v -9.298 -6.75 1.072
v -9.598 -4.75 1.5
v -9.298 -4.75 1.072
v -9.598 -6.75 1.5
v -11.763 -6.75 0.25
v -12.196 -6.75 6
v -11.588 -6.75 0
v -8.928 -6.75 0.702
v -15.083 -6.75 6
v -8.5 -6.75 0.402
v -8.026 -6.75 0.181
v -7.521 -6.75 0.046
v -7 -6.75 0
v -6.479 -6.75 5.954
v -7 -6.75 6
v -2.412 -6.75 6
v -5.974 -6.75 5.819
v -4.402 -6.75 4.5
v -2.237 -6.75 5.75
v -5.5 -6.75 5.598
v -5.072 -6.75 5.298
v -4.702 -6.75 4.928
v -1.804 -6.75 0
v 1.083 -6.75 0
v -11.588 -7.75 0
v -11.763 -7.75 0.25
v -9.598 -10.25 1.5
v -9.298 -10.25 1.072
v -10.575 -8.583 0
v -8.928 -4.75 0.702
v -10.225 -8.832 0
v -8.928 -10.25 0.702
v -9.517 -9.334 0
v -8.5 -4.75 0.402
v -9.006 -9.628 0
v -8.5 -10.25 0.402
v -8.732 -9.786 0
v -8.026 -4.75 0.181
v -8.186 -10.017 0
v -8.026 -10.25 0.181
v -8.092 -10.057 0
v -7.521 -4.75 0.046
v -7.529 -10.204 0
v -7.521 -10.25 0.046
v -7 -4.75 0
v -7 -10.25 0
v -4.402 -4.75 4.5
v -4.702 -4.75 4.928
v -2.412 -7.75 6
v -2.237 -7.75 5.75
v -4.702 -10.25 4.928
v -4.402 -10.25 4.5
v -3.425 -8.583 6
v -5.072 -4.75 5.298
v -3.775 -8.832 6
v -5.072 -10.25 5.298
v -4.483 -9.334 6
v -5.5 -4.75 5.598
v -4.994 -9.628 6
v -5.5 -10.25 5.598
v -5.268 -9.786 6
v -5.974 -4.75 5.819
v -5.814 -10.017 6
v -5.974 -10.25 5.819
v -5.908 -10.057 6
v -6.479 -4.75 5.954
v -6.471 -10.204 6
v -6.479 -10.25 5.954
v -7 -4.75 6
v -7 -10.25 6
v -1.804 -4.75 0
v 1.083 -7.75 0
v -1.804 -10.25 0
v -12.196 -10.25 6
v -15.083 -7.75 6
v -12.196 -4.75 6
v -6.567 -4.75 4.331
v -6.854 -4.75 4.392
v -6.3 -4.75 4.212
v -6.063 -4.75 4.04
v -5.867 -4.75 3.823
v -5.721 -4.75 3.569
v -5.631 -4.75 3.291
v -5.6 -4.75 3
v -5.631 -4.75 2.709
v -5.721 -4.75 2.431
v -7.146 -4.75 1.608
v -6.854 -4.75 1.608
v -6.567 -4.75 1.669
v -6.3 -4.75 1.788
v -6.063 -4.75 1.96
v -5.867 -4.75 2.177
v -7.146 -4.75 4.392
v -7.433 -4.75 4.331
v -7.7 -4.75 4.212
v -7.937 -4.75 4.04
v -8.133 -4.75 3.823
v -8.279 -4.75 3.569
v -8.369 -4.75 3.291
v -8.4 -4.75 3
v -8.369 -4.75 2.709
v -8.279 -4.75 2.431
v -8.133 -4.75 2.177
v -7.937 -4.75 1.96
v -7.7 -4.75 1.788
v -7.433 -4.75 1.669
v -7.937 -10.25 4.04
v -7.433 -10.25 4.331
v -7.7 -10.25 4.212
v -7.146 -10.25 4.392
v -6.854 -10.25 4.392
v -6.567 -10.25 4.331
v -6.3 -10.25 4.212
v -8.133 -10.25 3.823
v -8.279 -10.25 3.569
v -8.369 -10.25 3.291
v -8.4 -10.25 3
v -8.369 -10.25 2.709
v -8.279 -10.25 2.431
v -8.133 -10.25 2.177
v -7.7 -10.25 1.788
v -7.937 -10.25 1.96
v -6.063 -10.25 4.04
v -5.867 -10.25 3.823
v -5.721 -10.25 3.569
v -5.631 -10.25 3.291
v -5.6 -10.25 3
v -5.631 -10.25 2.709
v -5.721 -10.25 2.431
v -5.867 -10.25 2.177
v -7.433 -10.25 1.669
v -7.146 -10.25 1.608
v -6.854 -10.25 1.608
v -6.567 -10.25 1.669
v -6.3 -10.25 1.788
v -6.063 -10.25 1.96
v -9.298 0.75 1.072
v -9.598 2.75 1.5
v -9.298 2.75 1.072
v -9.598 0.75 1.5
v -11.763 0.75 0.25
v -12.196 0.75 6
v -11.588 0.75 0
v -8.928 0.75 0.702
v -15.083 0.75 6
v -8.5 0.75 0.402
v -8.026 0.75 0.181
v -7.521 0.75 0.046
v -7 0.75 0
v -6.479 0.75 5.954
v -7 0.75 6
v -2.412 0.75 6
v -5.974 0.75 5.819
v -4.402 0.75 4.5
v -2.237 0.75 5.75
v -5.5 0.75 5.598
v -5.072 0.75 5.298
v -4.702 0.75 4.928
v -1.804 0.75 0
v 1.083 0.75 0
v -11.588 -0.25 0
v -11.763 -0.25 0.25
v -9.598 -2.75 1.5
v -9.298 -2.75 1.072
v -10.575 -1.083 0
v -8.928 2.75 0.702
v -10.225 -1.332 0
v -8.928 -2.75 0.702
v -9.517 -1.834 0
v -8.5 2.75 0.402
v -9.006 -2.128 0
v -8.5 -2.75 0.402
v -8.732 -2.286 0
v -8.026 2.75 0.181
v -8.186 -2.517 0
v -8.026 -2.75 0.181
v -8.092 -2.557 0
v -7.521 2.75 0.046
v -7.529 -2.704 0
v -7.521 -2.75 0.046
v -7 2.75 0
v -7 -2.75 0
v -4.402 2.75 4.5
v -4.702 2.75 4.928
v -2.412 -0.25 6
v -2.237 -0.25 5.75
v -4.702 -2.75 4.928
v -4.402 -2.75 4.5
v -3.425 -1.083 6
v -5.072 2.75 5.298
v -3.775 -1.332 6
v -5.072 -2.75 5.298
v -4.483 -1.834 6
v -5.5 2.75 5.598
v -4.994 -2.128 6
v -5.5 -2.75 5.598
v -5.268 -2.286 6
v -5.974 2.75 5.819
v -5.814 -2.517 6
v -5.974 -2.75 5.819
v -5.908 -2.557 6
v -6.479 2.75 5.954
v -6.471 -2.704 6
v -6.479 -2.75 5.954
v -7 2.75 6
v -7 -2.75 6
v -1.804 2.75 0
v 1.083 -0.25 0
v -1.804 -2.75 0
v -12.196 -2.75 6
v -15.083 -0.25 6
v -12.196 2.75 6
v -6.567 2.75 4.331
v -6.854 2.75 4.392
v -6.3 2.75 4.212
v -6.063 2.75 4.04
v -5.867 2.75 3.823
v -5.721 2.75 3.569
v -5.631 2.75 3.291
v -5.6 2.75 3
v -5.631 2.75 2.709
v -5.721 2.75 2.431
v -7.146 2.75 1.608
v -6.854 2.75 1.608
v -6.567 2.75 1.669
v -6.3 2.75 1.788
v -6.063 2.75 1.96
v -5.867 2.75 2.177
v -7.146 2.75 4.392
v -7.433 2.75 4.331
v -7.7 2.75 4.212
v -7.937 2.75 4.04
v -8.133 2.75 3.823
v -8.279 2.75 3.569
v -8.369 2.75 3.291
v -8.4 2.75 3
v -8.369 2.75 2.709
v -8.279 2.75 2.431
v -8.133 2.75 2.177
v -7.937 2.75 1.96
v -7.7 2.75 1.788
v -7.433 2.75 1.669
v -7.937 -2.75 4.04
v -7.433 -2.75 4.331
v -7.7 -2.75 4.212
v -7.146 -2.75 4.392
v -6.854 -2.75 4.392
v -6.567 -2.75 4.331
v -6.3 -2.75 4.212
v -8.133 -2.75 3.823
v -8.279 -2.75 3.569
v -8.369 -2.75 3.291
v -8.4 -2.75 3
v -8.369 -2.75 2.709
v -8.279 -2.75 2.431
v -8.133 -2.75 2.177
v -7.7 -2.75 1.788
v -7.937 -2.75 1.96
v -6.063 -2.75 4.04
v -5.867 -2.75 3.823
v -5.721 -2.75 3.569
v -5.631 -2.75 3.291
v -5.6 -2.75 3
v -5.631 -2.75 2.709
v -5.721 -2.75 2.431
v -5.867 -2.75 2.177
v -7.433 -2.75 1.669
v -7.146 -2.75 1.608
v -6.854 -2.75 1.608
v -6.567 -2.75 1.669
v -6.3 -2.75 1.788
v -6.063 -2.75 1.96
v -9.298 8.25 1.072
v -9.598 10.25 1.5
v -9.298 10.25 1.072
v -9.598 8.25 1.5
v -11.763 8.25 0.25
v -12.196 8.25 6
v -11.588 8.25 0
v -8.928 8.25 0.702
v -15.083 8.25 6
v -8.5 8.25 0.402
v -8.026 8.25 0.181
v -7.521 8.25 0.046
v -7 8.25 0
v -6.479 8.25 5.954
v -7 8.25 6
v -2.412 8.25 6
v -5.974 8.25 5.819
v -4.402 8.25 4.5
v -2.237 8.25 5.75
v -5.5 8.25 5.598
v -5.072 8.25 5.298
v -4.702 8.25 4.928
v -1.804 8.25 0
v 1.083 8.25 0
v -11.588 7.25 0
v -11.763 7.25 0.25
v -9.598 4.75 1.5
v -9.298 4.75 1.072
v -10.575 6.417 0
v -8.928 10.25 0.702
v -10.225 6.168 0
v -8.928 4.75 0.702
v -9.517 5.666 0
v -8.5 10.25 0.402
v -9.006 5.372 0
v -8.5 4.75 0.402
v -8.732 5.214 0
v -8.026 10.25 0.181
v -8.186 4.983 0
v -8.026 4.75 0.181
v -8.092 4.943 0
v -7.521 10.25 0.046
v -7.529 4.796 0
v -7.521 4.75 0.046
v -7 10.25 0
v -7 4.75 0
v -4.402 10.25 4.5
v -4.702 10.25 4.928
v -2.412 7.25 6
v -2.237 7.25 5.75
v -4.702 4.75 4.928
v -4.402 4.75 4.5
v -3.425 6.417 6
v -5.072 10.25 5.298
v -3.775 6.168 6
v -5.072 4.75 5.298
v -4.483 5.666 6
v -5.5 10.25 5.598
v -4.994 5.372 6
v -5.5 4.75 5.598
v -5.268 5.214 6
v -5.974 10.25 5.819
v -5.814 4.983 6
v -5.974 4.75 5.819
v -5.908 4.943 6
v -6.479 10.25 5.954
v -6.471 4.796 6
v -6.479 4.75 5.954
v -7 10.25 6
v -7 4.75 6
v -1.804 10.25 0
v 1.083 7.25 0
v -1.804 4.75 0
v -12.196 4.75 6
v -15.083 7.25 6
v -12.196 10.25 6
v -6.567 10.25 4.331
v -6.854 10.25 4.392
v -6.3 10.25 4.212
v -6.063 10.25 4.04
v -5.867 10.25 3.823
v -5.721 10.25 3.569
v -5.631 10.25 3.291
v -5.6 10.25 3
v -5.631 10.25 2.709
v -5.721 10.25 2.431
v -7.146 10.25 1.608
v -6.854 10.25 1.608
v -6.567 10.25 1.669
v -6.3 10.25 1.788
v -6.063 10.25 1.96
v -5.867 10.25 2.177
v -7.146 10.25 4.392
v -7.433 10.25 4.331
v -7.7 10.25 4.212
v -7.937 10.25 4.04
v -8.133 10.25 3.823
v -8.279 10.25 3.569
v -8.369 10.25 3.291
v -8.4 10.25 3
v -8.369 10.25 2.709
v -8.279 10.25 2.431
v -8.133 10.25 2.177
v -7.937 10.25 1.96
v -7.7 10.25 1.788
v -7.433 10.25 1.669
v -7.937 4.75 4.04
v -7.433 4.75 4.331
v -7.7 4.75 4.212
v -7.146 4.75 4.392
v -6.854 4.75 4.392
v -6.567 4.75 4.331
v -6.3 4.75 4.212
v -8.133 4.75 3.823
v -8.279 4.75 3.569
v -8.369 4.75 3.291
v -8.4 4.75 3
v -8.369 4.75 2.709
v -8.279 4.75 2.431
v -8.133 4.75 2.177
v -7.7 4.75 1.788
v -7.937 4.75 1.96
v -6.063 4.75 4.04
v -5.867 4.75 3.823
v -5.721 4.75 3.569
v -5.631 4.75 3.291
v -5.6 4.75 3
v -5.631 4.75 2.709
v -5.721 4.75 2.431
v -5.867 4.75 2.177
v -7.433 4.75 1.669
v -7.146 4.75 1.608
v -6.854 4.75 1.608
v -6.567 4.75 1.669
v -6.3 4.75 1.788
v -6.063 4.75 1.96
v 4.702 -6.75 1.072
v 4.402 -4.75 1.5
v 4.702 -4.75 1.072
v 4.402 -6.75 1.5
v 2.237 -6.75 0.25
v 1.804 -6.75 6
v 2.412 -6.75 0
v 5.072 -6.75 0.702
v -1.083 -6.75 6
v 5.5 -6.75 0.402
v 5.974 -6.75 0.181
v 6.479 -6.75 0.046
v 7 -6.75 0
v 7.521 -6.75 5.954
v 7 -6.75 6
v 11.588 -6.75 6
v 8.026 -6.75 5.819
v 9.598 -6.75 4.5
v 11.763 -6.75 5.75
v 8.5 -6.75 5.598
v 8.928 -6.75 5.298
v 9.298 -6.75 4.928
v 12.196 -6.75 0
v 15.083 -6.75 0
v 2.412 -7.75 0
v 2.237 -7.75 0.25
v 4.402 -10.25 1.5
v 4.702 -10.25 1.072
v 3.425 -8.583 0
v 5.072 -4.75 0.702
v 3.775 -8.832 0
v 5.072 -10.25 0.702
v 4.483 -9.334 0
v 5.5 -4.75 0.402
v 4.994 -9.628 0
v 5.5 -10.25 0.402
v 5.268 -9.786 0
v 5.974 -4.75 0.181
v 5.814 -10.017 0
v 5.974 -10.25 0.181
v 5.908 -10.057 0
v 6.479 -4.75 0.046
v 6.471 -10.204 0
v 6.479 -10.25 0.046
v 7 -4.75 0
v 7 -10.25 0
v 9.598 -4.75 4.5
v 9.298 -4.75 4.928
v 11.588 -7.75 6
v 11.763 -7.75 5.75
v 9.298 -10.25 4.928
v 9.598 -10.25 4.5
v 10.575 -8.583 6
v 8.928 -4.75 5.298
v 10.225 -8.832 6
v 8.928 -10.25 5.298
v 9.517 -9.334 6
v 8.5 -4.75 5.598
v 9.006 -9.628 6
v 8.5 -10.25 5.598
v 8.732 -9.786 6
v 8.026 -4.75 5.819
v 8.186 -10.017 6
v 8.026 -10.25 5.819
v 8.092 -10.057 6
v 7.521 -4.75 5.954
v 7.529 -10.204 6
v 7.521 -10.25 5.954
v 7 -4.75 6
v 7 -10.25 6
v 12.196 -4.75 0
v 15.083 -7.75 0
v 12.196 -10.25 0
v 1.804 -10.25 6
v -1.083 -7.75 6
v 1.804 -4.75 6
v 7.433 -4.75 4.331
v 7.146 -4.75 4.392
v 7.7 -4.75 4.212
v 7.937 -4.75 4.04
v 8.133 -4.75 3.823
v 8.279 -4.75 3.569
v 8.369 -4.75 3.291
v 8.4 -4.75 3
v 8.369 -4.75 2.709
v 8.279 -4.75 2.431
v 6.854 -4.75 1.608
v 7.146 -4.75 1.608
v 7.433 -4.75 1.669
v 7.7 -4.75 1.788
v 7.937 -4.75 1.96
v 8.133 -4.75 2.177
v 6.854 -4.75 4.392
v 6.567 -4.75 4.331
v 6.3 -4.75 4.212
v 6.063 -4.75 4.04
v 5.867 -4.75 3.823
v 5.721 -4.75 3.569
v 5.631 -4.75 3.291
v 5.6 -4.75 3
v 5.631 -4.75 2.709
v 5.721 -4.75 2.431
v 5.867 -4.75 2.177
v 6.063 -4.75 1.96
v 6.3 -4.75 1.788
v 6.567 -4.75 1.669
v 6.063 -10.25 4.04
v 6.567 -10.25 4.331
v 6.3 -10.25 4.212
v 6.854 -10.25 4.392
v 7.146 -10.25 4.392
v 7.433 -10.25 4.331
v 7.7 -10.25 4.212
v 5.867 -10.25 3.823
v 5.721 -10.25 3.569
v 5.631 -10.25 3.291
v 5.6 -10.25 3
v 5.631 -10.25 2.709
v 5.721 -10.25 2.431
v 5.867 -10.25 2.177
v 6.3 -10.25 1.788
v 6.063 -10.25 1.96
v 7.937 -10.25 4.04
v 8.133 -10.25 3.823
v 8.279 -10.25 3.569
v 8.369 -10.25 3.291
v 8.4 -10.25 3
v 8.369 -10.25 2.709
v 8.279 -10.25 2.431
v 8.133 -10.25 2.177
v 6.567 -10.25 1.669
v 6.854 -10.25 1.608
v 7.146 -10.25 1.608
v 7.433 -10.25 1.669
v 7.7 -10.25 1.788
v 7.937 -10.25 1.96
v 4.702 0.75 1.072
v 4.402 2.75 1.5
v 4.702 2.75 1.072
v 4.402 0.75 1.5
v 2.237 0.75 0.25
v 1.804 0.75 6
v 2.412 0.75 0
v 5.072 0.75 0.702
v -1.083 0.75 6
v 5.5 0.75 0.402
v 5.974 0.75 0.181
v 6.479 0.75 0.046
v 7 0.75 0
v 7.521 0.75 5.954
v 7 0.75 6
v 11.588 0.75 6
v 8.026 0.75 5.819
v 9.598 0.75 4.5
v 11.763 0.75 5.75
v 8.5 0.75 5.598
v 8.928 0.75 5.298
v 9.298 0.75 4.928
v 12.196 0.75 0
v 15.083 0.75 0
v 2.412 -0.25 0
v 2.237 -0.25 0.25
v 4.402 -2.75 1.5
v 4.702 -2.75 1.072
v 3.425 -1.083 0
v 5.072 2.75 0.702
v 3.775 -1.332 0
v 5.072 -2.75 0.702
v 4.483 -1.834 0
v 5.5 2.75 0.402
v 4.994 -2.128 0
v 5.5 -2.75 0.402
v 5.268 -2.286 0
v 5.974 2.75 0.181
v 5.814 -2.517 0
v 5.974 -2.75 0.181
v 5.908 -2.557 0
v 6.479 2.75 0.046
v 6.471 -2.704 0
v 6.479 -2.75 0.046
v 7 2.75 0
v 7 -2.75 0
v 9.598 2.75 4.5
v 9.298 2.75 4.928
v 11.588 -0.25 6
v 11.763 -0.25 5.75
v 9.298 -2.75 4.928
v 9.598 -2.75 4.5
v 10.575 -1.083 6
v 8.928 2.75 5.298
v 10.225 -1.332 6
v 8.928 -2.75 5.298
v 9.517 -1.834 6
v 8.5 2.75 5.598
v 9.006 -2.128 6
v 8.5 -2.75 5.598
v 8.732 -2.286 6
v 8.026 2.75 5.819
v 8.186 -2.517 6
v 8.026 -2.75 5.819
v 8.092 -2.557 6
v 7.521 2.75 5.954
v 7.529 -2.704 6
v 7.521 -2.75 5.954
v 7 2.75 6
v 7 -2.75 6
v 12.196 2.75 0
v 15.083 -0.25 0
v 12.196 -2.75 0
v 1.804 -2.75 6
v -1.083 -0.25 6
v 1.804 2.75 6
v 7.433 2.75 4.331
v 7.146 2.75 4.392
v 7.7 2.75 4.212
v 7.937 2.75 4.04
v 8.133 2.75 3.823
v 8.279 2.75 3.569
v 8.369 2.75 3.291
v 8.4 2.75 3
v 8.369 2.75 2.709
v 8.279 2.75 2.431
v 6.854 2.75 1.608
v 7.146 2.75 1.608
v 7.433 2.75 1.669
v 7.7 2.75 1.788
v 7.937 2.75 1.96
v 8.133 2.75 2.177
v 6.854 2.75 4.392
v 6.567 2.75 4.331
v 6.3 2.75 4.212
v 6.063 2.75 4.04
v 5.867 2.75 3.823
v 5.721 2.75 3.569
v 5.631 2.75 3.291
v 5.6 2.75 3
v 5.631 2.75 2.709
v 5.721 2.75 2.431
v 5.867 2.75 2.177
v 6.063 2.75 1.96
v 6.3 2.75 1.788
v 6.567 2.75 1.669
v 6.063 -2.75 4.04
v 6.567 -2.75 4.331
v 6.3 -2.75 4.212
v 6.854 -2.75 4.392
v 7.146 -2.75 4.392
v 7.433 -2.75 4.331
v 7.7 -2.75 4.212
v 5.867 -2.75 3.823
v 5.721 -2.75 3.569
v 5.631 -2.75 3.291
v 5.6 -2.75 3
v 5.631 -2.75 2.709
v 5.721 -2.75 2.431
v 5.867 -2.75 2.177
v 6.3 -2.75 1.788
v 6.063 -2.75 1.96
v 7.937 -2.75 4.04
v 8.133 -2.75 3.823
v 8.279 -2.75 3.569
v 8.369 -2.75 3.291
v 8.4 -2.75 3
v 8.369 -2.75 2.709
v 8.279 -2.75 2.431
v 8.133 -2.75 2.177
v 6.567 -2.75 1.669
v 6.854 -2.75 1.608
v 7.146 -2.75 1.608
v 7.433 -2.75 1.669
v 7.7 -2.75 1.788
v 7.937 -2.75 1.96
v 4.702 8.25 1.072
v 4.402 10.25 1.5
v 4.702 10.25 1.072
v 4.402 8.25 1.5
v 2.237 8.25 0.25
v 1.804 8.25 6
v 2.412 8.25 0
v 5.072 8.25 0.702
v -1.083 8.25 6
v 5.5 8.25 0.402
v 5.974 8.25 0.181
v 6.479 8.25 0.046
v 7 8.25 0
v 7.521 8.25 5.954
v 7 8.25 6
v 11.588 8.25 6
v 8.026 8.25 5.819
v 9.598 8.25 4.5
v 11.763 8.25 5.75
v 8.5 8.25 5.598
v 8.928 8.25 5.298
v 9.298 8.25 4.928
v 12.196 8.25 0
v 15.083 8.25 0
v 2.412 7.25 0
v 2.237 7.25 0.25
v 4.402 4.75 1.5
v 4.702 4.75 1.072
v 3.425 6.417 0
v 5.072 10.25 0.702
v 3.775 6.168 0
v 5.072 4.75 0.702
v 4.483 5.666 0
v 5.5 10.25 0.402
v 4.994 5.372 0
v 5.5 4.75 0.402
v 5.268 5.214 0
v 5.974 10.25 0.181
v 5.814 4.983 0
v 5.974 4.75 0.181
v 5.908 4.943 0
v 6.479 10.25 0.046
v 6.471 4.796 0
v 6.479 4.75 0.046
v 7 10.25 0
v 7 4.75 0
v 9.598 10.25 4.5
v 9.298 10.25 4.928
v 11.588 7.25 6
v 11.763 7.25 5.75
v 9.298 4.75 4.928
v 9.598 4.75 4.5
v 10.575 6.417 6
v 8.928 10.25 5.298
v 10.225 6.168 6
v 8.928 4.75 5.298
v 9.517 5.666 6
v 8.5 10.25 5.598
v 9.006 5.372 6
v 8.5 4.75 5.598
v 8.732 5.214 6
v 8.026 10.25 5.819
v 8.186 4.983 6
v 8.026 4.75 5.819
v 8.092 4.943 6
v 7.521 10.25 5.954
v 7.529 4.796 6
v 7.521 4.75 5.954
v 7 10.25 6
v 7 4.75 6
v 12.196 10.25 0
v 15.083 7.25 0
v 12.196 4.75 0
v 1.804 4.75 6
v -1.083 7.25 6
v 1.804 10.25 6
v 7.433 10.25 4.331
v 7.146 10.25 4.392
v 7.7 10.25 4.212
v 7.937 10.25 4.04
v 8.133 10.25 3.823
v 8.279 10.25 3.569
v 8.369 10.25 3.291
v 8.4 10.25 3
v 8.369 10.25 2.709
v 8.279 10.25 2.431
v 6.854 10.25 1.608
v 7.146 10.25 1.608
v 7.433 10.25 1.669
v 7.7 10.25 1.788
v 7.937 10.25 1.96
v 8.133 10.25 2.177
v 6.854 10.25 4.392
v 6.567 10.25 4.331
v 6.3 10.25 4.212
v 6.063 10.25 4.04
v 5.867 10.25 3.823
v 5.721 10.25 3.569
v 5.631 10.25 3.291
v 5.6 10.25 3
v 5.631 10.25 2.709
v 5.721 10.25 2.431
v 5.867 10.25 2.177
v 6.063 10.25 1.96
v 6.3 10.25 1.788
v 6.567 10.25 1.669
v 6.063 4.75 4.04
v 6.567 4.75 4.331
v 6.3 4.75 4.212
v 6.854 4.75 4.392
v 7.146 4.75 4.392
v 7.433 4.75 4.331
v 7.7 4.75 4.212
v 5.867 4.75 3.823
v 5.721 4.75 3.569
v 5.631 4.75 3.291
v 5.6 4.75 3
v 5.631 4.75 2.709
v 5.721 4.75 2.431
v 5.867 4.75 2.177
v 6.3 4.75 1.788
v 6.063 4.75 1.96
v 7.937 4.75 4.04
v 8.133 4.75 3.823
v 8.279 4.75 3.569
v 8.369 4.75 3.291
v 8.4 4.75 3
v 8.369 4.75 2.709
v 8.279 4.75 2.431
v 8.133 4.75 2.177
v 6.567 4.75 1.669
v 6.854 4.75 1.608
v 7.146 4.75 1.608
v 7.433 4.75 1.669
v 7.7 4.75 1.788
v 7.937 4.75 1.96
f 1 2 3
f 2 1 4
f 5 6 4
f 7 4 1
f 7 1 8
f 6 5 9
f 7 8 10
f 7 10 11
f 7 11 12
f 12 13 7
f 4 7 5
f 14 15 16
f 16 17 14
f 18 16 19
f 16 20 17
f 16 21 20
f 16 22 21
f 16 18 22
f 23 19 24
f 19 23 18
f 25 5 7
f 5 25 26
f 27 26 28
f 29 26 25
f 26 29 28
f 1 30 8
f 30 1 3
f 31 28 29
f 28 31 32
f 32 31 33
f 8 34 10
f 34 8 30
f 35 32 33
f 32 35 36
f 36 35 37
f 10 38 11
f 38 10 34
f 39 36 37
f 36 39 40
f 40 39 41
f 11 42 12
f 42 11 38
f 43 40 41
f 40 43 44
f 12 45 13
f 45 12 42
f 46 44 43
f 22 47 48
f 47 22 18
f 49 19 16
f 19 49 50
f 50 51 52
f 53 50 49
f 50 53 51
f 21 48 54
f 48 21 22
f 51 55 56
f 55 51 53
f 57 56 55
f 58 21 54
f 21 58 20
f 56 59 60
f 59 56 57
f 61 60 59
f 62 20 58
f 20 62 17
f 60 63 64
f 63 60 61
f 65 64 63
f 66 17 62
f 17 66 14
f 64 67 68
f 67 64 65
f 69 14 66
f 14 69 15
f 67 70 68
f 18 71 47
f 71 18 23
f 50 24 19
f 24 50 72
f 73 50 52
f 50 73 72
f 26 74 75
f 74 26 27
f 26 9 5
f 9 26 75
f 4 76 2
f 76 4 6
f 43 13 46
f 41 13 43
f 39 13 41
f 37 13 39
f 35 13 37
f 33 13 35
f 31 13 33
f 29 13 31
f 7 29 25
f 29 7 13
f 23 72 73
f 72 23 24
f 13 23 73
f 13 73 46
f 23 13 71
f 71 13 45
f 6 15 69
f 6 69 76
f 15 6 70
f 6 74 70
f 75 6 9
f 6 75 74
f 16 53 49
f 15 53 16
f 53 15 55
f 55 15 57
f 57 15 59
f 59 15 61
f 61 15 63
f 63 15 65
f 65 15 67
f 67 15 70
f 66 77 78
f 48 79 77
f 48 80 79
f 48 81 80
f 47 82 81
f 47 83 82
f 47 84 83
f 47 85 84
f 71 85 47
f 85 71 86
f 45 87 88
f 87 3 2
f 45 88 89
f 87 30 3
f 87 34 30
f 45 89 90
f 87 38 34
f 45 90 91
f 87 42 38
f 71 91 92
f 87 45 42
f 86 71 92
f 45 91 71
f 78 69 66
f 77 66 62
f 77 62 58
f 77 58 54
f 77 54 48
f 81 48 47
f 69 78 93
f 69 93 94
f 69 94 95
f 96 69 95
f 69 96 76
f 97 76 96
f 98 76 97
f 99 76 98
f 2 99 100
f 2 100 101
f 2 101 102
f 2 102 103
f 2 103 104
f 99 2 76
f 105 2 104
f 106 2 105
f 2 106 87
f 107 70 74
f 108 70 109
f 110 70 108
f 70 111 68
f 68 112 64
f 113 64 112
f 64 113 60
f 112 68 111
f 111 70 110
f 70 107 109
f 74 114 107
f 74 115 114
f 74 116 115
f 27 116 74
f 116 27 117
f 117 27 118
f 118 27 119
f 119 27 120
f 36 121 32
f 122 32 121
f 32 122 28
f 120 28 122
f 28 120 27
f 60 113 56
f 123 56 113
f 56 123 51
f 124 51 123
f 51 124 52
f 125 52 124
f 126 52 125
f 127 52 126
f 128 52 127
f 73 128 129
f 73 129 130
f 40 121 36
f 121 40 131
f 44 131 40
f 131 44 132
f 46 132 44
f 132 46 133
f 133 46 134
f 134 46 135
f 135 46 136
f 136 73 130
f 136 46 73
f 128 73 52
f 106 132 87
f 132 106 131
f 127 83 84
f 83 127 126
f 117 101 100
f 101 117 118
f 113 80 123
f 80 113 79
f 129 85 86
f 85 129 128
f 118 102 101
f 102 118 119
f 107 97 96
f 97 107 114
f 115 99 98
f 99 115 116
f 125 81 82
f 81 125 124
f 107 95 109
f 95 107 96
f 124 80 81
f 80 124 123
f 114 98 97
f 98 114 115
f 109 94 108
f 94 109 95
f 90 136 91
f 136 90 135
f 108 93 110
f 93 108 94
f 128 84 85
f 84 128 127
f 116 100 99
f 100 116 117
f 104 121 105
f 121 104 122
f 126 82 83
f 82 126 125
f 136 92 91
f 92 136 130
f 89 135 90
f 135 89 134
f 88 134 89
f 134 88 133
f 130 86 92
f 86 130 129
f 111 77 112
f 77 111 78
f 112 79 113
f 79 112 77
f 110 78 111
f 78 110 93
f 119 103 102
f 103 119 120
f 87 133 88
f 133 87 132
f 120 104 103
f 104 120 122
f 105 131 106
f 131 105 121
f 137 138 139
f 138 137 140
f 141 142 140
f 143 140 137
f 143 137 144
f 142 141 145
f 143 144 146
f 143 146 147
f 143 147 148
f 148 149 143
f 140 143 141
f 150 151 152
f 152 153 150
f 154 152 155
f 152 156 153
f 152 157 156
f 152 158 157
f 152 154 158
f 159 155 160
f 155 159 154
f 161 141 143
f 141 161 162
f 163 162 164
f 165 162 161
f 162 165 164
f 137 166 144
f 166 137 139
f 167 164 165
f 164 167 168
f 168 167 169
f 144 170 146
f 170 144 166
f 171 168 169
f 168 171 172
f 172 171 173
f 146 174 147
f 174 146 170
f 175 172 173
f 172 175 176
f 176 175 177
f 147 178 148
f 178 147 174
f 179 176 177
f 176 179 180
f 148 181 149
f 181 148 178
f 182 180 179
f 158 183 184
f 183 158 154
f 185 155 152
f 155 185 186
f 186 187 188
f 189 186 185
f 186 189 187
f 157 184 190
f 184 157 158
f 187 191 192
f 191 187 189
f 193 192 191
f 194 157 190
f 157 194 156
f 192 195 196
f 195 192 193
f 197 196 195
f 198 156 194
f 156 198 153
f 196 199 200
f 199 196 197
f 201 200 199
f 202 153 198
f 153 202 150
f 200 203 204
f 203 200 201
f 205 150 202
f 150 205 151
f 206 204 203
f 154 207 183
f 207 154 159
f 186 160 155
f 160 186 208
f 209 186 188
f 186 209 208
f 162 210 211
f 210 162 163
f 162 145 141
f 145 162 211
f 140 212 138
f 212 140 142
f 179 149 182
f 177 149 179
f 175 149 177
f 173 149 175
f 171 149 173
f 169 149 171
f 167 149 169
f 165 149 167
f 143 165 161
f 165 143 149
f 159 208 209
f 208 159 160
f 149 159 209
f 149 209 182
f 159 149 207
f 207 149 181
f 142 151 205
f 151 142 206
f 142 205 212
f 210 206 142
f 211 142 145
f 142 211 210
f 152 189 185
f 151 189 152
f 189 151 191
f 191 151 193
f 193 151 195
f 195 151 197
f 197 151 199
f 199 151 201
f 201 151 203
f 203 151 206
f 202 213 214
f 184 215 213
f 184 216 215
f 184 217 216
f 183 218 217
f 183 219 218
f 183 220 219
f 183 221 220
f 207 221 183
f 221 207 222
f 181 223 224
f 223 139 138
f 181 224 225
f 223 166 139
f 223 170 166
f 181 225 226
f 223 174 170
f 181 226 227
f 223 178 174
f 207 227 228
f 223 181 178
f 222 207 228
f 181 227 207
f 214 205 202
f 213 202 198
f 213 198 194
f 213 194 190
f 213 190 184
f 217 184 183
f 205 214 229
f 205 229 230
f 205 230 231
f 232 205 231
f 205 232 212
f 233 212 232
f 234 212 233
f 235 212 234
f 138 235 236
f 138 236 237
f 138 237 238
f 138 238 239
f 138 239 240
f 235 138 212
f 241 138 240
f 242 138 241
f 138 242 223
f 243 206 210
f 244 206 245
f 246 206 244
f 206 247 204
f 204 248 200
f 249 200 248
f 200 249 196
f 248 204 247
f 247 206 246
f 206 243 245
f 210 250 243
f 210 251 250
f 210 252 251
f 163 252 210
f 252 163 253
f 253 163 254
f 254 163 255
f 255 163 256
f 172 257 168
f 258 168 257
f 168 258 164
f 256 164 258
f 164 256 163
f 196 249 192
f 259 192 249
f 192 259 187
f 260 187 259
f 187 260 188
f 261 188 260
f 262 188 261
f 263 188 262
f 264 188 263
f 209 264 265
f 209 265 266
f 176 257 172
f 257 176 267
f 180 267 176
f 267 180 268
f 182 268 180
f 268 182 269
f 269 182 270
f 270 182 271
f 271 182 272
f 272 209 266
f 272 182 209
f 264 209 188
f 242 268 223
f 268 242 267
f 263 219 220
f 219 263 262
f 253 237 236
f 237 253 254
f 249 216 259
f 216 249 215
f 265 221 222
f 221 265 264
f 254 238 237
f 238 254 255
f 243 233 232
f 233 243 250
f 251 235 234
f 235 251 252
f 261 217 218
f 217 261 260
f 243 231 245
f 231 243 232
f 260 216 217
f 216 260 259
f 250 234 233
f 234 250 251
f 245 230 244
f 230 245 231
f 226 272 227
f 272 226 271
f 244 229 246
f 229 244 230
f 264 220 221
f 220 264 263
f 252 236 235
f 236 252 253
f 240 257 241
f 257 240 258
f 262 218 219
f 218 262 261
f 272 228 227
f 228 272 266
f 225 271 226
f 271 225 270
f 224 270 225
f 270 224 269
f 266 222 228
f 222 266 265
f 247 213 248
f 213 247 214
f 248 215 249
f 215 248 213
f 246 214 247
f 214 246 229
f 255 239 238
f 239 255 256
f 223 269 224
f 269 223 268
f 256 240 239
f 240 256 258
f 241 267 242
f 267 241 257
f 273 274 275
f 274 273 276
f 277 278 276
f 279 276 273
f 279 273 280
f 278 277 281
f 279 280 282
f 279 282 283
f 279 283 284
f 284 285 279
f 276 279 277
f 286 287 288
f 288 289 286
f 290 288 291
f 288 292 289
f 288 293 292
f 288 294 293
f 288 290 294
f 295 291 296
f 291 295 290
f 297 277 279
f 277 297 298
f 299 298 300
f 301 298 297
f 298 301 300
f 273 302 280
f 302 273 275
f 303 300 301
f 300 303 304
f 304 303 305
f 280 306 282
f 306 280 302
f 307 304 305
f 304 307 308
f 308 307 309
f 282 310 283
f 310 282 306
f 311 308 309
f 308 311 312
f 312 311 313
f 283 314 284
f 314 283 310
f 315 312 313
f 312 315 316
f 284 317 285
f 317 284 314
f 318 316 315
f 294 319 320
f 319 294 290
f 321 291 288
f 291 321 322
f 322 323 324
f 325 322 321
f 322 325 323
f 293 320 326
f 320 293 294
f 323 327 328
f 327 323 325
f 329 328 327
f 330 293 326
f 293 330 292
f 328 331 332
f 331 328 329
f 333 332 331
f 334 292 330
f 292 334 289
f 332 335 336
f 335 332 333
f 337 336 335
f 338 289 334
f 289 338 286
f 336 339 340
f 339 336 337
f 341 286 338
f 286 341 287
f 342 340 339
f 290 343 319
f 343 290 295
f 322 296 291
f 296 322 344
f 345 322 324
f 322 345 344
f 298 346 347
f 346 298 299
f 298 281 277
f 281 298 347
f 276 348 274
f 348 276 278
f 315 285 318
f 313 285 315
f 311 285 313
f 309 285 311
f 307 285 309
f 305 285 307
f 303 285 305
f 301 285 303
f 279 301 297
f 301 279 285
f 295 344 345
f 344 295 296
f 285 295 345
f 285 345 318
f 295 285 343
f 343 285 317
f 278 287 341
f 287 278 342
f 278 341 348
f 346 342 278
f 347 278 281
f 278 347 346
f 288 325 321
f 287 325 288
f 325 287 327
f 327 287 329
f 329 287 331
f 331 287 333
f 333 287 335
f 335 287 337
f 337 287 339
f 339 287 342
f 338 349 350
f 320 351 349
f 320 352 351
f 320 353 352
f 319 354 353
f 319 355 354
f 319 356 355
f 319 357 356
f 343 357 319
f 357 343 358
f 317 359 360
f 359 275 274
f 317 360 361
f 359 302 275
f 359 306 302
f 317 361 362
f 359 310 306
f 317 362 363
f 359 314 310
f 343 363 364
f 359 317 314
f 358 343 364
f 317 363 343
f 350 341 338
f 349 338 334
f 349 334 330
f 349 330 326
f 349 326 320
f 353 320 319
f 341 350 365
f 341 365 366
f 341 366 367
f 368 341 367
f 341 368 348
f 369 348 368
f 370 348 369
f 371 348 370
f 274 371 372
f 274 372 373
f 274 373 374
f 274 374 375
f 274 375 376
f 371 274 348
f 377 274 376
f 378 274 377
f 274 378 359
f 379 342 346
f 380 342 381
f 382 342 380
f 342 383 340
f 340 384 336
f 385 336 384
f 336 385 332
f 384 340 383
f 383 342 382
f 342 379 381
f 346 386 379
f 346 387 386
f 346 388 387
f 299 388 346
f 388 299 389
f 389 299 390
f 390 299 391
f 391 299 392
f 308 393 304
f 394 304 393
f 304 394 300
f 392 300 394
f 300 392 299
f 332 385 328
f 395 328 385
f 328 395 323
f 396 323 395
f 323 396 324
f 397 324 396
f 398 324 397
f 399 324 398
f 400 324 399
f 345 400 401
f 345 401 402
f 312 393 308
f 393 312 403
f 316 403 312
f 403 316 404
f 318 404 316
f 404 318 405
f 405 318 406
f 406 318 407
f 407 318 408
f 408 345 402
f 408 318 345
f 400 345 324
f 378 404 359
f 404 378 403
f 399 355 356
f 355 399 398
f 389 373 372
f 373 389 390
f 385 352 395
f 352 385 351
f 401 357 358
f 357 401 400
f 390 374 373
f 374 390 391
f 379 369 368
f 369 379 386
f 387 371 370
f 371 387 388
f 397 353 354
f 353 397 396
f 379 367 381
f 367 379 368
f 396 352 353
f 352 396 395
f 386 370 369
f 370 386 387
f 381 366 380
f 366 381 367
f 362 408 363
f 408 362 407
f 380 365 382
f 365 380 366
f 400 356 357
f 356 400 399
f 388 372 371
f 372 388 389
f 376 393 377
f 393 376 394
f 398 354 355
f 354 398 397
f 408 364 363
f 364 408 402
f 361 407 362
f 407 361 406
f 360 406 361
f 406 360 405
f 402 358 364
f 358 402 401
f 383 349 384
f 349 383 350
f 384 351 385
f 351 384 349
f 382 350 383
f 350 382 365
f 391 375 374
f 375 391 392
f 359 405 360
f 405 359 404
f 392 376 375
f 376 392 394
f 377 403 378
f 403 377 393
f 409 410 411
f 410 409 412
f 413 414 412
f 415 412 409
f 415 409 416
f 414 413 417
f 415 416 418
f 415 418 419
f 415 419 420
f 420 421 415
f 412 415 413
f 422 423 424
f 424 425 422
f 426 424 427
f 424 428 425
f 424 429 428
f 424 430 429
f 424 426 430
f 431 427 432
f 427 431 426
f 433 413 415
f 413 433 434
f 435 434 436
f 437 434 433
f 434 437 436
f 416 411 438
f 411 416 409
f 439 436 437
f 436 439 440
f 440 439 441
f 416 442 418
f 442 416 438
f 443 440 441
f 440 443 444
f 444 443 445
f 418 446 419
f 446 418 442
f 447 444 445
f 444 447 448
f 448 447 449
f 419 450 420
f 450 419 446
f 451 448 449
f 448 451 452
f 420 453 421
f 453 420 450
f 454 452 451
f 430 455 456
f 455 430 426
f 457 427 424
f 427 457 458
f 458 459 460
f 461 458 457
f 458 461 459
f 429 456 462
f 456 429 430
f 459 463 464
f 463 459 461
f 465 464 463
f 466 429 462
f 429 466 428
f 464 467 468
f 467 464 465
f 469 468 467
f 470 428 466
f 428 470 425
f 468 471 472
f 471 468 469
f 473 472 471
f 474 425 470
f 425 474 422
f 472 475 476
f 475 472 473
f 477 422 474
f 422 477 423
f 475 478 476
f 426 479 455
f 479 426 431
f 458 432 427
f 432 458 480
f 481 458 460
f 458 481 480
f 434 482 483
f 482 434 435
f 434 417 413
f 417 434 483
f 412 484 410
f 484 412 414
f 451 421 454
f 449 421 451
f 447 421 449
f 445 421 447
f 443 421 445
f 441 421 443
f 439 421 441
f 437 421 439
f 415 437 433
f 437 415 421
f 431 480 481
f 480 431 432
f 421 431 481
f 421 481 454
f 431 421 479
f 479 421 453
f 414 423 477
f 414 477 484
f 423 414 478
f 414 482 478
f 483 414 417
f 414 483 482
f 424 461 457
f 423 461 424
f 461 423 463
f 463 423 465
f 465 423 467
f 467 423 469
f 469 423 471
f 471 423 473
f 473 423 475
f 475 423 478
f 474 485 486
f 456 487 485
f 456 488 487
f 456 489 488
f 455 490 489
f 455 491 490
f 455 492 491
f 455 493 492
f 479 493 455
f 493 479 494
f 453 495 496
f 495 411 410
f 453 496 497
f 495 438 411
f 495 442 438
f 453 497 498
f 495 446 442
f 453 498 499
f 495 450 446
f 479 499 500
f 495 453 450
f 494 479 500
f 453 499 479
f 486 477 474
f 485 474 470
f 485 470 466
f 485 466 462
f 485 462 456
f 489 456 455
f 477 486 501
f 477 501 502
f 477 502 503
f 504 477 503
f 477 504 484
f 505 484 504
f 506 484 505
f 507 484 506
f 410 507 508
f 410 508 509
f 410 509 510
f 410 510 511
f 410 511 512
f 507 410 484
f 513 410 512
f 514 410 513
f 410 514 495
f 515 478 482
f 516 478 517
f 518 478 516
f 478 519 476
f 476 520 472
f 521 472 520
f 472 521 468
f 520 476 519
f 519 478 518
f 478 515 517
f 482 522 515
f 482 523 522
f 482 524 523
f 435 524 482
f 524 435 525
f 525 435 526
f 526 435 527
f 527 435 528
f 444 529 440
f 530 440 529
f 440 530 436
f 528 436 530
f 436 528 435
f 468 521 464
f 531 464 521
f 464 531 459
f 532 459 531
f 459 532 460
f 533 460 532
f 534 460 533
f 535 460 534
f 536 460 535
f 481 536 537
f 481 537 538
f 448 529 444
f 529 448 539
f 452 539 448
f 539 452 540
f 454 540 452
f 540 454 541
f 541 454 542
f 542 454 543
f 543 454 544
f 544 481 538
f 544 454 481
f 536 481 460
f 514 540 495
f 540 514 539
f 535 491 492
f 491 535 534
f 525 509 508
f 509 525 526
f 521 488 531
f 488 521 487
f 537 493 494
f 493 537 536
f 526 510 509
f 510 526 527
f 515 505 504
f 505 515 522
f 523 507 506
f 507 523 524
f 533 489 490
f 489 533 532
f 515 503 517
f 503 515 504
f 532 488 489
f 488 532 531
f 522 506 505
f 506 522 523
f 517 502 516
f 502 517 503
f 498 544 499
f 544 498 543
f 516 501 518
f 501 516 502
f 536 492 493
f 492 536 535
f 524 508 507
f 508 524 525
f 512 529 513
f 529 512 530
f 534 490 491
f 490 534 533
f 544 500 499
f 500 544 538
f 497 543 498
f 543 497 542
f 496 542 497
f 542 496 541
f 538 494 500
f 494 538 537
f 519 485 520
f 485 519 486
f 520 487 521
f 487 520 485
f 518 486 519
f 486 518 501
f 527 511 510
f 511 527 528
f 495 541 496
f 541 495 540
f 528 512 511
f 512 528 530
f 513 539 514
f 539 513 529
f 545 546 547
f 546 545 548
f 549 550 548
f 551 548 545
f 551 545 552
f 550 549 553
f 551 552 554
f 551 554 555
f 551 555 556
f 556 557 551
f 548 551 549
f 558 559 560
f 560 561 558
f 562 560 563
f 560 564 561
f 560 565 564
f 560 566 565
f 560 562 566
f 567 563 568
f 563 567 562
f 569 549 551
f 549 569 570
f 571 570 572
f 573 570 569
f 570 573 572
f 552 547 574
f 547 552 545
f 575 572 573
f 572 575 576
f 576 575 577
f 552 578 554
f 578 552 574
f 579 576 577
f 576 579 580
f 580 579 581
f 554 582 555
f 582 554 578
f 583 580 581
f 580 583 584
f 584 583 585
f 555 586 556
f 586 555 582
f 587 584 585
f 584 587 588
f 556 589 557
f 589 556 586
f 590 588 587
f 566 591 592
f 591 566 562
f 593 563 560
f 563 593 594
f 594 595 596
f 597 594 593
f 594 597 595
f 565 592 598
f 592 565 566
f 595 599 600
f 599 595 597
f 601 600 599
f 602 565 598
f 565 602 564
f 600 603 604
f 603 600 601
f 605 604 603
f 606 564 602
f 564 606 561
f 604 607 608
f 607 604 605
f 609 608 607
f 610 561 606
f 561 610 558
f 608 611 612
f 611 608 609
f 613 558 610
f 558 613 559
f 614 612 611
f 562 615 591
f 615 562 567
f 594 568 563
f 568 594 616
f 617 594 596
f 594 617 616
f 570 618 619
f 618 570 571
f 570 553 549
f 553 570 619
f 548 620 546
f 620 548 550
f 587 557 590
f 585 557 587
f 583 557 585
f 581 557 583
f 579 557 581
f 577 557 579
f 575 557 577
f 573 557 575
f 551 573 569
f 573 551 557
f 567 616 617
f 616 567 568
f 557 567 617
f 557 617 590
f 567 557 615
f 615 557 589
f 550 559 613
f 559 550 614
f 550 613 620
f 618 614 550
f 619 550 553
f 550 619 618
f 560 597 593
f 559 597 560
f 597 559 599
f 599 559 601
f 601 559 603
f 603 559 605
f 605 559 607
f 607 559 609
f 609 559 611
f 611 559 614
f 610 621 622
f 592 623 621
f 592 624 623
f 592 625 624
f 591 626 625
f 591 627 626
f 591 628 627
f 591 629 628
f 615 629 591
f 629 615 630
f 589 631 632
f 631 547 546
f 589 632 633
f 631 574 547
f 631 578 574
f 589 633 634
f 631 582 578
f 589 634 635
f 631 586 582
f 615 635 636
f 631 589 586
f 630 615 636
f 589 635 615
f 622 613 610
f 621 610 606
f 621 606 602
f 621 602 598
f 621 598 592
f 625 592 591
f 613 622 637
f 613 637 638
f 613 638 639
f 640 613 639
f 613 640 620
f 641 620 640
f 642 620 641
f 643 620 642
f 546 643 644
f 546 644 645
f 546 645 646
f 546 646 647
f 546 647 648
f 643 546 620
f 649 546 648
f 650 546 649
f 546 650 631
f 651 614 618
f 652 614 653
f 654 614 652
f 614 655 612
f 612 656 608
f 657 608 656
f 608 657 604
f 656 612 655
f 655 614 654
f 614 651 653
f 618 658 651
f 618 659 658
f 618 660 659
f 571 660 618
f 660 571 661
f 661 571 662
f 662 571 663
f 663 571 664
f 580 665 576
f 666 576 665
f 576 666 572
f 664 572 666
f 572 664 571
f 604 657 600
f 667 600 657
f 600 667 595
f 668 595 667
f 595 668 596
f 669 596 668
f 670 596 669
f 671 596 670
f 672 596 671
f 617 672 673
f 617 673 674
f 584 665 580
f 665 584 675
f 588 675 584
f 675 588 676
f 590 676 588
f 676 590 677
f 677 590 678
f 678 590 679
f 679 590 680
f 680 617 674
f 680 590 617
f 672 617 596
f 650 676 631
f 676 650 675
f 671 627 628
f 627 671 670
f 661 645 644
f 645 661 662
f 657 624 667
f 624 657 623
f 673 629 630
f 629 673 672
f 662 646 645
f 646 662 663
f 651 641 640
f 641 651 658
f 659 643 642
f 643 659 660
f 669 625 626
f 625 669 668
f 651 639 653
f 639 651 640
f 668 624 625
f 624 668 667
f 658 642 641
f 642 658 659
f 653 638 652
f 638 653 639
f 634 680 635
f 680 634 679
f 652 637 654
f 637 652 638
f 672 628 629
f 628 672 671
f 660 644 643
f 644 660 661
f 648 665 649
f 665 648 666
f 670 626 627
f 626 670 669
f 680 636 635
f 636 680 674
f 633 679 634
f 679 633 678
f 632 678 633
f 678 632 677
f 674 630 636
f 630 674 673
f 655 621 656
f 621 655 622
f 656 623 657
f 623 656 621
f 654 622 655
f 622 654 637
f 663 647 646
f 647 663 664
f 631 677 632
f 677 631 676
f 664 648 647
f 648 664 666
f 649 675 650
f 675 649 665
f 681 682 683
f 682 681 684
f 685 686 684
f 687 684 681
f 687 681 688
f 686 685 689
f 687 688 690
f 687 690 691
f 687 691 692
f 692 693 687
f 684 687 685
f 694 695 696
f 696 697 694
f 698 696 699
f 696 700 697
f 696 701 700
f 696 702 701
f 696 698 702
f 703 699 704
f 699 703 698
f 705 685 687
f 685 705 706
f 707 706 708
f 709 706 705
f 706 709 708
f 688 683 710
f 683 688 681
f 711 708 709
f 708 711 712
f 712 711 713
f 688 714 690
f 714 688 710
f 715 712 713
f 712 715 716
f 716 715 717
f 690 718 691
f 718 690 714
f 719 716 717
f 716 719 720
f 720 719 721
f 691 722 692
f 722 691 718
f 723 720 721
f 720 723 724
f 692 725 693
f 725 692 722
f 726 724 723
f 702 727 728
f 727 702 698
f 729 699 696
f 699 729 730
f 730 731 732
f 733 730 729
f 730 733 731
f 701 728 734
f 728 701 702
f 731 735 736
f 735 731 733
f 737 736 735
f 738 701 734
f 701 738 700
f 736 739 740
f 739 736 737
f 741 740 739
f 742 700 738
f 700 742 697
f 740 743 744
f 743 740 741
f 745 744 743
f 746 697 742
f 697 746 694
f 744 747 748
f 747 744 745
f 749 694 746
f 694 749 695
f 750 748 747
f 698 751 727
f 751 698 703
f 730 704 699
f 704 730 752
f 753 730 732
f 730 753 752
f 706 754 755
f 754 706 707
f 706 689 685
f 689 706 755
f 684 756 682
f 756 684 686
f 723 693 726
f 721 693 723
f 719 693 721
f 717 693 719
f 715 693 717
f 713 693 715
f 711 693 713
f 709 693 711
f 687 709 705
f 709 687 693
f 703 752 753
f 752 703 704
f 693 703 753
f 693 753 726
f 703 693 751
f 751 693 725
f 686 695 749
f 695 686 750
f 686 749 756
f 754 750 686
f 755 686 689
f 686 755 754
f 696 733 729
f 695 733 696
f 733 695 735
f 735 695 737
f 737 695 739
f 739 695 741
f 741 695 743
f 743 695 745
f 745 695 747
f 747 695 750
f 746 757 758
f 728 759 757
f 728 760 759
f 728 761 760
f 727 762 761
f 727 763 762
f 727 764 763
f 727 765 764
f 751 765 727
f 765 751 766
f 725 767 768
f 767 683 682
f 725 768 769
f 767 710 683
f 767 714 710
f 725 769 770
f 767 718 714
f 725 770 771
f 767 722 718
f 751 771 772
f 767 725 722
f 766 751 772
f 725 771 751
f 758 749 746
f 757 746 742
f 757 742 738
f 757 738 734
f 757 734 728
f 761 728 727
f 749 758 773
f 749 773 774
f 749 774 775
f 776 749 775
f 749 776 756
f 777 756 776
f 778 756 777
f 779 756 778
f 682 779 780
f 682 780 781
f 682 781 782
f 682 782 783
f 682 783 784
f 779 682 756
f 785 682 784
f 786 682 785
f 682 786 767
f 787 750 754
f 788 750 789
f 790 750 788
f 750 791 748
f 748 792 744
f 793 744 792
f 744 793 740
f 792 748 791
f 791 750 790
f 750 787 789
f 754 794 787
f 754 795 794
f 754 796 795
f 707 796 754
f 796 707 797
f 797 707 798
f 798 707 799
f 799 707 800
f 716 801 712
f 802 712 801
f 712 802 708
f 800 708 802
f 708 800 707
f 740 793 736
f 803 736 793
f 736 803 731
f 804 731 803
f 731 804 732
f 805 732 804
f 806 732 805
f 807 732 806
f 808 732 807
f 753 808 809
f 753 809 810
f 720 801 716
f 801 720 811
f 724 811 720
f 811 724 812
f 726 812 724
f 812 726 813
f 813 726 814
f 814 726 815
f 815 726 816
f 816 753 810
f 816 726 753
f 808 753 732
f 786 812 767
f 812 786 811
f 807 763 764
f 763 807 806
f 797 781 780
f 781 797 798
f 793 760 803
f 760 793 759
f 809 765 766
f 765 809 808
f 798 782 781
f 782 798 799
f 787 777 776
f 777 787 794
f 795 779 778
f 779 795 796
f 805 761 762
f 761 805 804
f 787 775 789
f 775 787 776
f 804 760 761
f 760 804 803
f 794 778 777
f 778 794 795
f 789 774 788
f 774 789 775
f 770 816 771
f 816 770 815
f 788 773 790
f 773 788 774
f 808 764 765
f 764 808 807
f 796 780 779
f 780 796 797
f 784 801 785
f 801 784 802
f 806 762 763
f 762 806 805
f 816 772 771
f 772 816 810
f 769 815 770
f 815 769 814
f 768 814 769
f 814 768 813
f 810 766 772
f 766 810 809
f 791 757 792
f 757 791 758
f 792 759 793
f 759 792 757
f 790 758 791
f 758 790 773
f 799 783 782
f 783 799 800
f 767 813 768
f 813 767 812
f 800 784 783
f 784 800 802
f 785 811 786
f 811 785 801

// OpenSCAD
width = 11; //11 for 20mm, 14 for 25mm
slot_width = 6;
depth = 5.5; //5.5 for 20mm, 7 for 25mm
slot_depth = 2;
screw_size = 3;
nut_size = 6.2;
nut_depth = 3;

repeat_x = 2;
repeat_y = 3;

// ratio for converting diameter to apothem
/*
da6 = 1 / cos(180 / 6) / 2;
da8 = 1 / cos(180 / 8) / 2;
da12 = 1 / cos(180 / 12) / 2;
*/
%square(100, center = true);
for(x = [-(repeat_x - 1) / 2:(repeat_x - 1) / 2]) for(y = [-(repeat_y - 1) / 2:(repeat_y - 1) / 2]) translate([x * (width + 3), y * (depth + 2), slot_width / 2]) render() 
difference() {
	linear_extrude(height = slot_width, center = true, convexity = 5) difference() {
		square([width * 1.5, depth], center = true);
	}
	rotate([0, -30, 0]) {
		linear_extrude(height = slot_width * 5, center = true, convexity = 5) difference() {
			for(side = [0, 1]) mirror([side, 0, 0]) cut();
		}
		rotate([-90, 0, 0]) difference() {
			rotate(90) rotate_extrude(convexity = 5, $fn = 36) cut();
			for(side = [0, 1]) for(a = [0, 1]) rotate(side * 180 + a * 30) translate([0, 0, -50]) cube(100);
		}
	}
	rotate([90, 0, 0]) #cylinder(r = 2.8/2, h = 100, center = true, $fn = 30);
	//rotate([90, 0, 0]) cylinder(r = screw_size * da6, h = 100, center = true, $fn = 30);
	//rotate([90, 0, 0]) #translate([0, 0, depth / 2 - nut_depth]) cylinder(r = nut_size / 2, h = 100, $fn = 6);
}

module cut() {
	translate([width, -1]) square([width, depth + 2], center = true);
	translate([slot_width / 2, depth / 2 - slot_depth]) square([width, depth]);
	translate([slot_width / 2, -depth / 2]) rotate(-45) square([width, depth]);
}
